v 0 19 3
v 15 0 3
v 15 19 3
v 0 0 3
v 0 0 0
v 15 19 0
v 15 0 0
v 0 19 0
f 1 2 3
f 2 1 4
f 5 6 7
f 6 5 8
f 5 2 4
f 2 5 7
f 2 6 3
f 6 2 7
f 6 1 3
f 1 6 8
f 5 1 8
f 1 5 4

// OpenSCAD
// Generated by SolidPython 1.0.1 on 2020-07-29 00:46:56


cube(size = [15, 19, 3]);
/***********************************************
*********      SolidPython code:      **********
************************************************
 
# import packages: SolidPython
from solid import *
from solid.utils import *
from itertools import chain, combinations, permutations


class Resize:

    def __init__(self, scad_file):
        self.scad_file = scad_file
        #self.scad_file = import_scad(scad_file)
        # cone/cylinder param:
        self.r1 = 0
        self.r2 = 0
        self.h = 0
        # rectangular prism param:
        self.w = 0
        self.l = 0
        # ellipse param:
        self.r = 0

    # import OpenScad code (file name corresponds to shape)


    # classify shape + parameters
    def assign(self, param1, param2, param3):
        if self.scad_file == 'cone.scad':
            self.r1 = param1
            self.r2 = param2
            self.h = param3
        elif self.scad_file == 'cylinder.scad':
            self.r1 = param1
            self.r2 = param2
            self.h = param3
        elif self.scad_file == 'rectangularPrism.scad':
            self.h = param1
            self.l = param2
            self.w = param3
        else:
            self.r = param1
            self.h = param2

    # resize parameters
    def iterate(self):
        x = range(3, 20, 2)
        i = 1
        if self.scad_file == 'cone.scad':
            tempList = list(permutations(x, 2))
            for temp in tempList:
                param1 = temp[0]
                param2 = temp[1]
                filepath = 'produced_scad_files/' + 'cone' + str(param1) + '_' + str(param2) + '_' + '.scad'
                scad_render_to_file(cylinder(h=param1, r1=param2, r2=0), filepath)

        elif self.scad_file == 'cylinder.scad':
            tempList = list(permutations(x, 3))
            for temp in tempList:
                param1 = temp[0]
                param2 = temp[1]
                filepath = 'produced_scad_files/' + 'cylinder' + str(param1) + '_' + str(param2) + '_' + '.scad'
                scad_render_to_file(cylinder(h=param1, r1=param2, r2=param2), filepath)

        elif self.scad_file == 'rectangularPrism.scad':
            tempList = list(permutations(x, 3))
            for temp in tempList:
                param1 = temp[0]
                param2 = temp[1]
                param3 = temp[2]
                filepath = 'produced_scad_files/' + 'rectangularPrism' + str(param1) + '_' + str(param2) + '_' + str(
                    param3) + '.scad'
                scad_render_to_file(cube(size=(param1, param2, param3)), filepath)

        elif self.scad_file == 'ellipse.scad':
            tempList = list(permutations(x, 4))
            for temp in tempList:
                param1 = temp[0]
                param2 = temp[1]
                param3 = temp[2]
                param4 = temp[3]
                filepath = 'produced_scad_files/' + 'ellipse' + str(param1) + '_' + str(param2) + '_' + str(param3) + '_' + str(param4) + '.scad'
                scad_render_to_file(scale([param1, param2, param3])(sphere(r=param4)), filepath)

    def render_to_scadfile(self):
        scad_render_to_file(scad, 'example.scad') 
 
************************************************/
